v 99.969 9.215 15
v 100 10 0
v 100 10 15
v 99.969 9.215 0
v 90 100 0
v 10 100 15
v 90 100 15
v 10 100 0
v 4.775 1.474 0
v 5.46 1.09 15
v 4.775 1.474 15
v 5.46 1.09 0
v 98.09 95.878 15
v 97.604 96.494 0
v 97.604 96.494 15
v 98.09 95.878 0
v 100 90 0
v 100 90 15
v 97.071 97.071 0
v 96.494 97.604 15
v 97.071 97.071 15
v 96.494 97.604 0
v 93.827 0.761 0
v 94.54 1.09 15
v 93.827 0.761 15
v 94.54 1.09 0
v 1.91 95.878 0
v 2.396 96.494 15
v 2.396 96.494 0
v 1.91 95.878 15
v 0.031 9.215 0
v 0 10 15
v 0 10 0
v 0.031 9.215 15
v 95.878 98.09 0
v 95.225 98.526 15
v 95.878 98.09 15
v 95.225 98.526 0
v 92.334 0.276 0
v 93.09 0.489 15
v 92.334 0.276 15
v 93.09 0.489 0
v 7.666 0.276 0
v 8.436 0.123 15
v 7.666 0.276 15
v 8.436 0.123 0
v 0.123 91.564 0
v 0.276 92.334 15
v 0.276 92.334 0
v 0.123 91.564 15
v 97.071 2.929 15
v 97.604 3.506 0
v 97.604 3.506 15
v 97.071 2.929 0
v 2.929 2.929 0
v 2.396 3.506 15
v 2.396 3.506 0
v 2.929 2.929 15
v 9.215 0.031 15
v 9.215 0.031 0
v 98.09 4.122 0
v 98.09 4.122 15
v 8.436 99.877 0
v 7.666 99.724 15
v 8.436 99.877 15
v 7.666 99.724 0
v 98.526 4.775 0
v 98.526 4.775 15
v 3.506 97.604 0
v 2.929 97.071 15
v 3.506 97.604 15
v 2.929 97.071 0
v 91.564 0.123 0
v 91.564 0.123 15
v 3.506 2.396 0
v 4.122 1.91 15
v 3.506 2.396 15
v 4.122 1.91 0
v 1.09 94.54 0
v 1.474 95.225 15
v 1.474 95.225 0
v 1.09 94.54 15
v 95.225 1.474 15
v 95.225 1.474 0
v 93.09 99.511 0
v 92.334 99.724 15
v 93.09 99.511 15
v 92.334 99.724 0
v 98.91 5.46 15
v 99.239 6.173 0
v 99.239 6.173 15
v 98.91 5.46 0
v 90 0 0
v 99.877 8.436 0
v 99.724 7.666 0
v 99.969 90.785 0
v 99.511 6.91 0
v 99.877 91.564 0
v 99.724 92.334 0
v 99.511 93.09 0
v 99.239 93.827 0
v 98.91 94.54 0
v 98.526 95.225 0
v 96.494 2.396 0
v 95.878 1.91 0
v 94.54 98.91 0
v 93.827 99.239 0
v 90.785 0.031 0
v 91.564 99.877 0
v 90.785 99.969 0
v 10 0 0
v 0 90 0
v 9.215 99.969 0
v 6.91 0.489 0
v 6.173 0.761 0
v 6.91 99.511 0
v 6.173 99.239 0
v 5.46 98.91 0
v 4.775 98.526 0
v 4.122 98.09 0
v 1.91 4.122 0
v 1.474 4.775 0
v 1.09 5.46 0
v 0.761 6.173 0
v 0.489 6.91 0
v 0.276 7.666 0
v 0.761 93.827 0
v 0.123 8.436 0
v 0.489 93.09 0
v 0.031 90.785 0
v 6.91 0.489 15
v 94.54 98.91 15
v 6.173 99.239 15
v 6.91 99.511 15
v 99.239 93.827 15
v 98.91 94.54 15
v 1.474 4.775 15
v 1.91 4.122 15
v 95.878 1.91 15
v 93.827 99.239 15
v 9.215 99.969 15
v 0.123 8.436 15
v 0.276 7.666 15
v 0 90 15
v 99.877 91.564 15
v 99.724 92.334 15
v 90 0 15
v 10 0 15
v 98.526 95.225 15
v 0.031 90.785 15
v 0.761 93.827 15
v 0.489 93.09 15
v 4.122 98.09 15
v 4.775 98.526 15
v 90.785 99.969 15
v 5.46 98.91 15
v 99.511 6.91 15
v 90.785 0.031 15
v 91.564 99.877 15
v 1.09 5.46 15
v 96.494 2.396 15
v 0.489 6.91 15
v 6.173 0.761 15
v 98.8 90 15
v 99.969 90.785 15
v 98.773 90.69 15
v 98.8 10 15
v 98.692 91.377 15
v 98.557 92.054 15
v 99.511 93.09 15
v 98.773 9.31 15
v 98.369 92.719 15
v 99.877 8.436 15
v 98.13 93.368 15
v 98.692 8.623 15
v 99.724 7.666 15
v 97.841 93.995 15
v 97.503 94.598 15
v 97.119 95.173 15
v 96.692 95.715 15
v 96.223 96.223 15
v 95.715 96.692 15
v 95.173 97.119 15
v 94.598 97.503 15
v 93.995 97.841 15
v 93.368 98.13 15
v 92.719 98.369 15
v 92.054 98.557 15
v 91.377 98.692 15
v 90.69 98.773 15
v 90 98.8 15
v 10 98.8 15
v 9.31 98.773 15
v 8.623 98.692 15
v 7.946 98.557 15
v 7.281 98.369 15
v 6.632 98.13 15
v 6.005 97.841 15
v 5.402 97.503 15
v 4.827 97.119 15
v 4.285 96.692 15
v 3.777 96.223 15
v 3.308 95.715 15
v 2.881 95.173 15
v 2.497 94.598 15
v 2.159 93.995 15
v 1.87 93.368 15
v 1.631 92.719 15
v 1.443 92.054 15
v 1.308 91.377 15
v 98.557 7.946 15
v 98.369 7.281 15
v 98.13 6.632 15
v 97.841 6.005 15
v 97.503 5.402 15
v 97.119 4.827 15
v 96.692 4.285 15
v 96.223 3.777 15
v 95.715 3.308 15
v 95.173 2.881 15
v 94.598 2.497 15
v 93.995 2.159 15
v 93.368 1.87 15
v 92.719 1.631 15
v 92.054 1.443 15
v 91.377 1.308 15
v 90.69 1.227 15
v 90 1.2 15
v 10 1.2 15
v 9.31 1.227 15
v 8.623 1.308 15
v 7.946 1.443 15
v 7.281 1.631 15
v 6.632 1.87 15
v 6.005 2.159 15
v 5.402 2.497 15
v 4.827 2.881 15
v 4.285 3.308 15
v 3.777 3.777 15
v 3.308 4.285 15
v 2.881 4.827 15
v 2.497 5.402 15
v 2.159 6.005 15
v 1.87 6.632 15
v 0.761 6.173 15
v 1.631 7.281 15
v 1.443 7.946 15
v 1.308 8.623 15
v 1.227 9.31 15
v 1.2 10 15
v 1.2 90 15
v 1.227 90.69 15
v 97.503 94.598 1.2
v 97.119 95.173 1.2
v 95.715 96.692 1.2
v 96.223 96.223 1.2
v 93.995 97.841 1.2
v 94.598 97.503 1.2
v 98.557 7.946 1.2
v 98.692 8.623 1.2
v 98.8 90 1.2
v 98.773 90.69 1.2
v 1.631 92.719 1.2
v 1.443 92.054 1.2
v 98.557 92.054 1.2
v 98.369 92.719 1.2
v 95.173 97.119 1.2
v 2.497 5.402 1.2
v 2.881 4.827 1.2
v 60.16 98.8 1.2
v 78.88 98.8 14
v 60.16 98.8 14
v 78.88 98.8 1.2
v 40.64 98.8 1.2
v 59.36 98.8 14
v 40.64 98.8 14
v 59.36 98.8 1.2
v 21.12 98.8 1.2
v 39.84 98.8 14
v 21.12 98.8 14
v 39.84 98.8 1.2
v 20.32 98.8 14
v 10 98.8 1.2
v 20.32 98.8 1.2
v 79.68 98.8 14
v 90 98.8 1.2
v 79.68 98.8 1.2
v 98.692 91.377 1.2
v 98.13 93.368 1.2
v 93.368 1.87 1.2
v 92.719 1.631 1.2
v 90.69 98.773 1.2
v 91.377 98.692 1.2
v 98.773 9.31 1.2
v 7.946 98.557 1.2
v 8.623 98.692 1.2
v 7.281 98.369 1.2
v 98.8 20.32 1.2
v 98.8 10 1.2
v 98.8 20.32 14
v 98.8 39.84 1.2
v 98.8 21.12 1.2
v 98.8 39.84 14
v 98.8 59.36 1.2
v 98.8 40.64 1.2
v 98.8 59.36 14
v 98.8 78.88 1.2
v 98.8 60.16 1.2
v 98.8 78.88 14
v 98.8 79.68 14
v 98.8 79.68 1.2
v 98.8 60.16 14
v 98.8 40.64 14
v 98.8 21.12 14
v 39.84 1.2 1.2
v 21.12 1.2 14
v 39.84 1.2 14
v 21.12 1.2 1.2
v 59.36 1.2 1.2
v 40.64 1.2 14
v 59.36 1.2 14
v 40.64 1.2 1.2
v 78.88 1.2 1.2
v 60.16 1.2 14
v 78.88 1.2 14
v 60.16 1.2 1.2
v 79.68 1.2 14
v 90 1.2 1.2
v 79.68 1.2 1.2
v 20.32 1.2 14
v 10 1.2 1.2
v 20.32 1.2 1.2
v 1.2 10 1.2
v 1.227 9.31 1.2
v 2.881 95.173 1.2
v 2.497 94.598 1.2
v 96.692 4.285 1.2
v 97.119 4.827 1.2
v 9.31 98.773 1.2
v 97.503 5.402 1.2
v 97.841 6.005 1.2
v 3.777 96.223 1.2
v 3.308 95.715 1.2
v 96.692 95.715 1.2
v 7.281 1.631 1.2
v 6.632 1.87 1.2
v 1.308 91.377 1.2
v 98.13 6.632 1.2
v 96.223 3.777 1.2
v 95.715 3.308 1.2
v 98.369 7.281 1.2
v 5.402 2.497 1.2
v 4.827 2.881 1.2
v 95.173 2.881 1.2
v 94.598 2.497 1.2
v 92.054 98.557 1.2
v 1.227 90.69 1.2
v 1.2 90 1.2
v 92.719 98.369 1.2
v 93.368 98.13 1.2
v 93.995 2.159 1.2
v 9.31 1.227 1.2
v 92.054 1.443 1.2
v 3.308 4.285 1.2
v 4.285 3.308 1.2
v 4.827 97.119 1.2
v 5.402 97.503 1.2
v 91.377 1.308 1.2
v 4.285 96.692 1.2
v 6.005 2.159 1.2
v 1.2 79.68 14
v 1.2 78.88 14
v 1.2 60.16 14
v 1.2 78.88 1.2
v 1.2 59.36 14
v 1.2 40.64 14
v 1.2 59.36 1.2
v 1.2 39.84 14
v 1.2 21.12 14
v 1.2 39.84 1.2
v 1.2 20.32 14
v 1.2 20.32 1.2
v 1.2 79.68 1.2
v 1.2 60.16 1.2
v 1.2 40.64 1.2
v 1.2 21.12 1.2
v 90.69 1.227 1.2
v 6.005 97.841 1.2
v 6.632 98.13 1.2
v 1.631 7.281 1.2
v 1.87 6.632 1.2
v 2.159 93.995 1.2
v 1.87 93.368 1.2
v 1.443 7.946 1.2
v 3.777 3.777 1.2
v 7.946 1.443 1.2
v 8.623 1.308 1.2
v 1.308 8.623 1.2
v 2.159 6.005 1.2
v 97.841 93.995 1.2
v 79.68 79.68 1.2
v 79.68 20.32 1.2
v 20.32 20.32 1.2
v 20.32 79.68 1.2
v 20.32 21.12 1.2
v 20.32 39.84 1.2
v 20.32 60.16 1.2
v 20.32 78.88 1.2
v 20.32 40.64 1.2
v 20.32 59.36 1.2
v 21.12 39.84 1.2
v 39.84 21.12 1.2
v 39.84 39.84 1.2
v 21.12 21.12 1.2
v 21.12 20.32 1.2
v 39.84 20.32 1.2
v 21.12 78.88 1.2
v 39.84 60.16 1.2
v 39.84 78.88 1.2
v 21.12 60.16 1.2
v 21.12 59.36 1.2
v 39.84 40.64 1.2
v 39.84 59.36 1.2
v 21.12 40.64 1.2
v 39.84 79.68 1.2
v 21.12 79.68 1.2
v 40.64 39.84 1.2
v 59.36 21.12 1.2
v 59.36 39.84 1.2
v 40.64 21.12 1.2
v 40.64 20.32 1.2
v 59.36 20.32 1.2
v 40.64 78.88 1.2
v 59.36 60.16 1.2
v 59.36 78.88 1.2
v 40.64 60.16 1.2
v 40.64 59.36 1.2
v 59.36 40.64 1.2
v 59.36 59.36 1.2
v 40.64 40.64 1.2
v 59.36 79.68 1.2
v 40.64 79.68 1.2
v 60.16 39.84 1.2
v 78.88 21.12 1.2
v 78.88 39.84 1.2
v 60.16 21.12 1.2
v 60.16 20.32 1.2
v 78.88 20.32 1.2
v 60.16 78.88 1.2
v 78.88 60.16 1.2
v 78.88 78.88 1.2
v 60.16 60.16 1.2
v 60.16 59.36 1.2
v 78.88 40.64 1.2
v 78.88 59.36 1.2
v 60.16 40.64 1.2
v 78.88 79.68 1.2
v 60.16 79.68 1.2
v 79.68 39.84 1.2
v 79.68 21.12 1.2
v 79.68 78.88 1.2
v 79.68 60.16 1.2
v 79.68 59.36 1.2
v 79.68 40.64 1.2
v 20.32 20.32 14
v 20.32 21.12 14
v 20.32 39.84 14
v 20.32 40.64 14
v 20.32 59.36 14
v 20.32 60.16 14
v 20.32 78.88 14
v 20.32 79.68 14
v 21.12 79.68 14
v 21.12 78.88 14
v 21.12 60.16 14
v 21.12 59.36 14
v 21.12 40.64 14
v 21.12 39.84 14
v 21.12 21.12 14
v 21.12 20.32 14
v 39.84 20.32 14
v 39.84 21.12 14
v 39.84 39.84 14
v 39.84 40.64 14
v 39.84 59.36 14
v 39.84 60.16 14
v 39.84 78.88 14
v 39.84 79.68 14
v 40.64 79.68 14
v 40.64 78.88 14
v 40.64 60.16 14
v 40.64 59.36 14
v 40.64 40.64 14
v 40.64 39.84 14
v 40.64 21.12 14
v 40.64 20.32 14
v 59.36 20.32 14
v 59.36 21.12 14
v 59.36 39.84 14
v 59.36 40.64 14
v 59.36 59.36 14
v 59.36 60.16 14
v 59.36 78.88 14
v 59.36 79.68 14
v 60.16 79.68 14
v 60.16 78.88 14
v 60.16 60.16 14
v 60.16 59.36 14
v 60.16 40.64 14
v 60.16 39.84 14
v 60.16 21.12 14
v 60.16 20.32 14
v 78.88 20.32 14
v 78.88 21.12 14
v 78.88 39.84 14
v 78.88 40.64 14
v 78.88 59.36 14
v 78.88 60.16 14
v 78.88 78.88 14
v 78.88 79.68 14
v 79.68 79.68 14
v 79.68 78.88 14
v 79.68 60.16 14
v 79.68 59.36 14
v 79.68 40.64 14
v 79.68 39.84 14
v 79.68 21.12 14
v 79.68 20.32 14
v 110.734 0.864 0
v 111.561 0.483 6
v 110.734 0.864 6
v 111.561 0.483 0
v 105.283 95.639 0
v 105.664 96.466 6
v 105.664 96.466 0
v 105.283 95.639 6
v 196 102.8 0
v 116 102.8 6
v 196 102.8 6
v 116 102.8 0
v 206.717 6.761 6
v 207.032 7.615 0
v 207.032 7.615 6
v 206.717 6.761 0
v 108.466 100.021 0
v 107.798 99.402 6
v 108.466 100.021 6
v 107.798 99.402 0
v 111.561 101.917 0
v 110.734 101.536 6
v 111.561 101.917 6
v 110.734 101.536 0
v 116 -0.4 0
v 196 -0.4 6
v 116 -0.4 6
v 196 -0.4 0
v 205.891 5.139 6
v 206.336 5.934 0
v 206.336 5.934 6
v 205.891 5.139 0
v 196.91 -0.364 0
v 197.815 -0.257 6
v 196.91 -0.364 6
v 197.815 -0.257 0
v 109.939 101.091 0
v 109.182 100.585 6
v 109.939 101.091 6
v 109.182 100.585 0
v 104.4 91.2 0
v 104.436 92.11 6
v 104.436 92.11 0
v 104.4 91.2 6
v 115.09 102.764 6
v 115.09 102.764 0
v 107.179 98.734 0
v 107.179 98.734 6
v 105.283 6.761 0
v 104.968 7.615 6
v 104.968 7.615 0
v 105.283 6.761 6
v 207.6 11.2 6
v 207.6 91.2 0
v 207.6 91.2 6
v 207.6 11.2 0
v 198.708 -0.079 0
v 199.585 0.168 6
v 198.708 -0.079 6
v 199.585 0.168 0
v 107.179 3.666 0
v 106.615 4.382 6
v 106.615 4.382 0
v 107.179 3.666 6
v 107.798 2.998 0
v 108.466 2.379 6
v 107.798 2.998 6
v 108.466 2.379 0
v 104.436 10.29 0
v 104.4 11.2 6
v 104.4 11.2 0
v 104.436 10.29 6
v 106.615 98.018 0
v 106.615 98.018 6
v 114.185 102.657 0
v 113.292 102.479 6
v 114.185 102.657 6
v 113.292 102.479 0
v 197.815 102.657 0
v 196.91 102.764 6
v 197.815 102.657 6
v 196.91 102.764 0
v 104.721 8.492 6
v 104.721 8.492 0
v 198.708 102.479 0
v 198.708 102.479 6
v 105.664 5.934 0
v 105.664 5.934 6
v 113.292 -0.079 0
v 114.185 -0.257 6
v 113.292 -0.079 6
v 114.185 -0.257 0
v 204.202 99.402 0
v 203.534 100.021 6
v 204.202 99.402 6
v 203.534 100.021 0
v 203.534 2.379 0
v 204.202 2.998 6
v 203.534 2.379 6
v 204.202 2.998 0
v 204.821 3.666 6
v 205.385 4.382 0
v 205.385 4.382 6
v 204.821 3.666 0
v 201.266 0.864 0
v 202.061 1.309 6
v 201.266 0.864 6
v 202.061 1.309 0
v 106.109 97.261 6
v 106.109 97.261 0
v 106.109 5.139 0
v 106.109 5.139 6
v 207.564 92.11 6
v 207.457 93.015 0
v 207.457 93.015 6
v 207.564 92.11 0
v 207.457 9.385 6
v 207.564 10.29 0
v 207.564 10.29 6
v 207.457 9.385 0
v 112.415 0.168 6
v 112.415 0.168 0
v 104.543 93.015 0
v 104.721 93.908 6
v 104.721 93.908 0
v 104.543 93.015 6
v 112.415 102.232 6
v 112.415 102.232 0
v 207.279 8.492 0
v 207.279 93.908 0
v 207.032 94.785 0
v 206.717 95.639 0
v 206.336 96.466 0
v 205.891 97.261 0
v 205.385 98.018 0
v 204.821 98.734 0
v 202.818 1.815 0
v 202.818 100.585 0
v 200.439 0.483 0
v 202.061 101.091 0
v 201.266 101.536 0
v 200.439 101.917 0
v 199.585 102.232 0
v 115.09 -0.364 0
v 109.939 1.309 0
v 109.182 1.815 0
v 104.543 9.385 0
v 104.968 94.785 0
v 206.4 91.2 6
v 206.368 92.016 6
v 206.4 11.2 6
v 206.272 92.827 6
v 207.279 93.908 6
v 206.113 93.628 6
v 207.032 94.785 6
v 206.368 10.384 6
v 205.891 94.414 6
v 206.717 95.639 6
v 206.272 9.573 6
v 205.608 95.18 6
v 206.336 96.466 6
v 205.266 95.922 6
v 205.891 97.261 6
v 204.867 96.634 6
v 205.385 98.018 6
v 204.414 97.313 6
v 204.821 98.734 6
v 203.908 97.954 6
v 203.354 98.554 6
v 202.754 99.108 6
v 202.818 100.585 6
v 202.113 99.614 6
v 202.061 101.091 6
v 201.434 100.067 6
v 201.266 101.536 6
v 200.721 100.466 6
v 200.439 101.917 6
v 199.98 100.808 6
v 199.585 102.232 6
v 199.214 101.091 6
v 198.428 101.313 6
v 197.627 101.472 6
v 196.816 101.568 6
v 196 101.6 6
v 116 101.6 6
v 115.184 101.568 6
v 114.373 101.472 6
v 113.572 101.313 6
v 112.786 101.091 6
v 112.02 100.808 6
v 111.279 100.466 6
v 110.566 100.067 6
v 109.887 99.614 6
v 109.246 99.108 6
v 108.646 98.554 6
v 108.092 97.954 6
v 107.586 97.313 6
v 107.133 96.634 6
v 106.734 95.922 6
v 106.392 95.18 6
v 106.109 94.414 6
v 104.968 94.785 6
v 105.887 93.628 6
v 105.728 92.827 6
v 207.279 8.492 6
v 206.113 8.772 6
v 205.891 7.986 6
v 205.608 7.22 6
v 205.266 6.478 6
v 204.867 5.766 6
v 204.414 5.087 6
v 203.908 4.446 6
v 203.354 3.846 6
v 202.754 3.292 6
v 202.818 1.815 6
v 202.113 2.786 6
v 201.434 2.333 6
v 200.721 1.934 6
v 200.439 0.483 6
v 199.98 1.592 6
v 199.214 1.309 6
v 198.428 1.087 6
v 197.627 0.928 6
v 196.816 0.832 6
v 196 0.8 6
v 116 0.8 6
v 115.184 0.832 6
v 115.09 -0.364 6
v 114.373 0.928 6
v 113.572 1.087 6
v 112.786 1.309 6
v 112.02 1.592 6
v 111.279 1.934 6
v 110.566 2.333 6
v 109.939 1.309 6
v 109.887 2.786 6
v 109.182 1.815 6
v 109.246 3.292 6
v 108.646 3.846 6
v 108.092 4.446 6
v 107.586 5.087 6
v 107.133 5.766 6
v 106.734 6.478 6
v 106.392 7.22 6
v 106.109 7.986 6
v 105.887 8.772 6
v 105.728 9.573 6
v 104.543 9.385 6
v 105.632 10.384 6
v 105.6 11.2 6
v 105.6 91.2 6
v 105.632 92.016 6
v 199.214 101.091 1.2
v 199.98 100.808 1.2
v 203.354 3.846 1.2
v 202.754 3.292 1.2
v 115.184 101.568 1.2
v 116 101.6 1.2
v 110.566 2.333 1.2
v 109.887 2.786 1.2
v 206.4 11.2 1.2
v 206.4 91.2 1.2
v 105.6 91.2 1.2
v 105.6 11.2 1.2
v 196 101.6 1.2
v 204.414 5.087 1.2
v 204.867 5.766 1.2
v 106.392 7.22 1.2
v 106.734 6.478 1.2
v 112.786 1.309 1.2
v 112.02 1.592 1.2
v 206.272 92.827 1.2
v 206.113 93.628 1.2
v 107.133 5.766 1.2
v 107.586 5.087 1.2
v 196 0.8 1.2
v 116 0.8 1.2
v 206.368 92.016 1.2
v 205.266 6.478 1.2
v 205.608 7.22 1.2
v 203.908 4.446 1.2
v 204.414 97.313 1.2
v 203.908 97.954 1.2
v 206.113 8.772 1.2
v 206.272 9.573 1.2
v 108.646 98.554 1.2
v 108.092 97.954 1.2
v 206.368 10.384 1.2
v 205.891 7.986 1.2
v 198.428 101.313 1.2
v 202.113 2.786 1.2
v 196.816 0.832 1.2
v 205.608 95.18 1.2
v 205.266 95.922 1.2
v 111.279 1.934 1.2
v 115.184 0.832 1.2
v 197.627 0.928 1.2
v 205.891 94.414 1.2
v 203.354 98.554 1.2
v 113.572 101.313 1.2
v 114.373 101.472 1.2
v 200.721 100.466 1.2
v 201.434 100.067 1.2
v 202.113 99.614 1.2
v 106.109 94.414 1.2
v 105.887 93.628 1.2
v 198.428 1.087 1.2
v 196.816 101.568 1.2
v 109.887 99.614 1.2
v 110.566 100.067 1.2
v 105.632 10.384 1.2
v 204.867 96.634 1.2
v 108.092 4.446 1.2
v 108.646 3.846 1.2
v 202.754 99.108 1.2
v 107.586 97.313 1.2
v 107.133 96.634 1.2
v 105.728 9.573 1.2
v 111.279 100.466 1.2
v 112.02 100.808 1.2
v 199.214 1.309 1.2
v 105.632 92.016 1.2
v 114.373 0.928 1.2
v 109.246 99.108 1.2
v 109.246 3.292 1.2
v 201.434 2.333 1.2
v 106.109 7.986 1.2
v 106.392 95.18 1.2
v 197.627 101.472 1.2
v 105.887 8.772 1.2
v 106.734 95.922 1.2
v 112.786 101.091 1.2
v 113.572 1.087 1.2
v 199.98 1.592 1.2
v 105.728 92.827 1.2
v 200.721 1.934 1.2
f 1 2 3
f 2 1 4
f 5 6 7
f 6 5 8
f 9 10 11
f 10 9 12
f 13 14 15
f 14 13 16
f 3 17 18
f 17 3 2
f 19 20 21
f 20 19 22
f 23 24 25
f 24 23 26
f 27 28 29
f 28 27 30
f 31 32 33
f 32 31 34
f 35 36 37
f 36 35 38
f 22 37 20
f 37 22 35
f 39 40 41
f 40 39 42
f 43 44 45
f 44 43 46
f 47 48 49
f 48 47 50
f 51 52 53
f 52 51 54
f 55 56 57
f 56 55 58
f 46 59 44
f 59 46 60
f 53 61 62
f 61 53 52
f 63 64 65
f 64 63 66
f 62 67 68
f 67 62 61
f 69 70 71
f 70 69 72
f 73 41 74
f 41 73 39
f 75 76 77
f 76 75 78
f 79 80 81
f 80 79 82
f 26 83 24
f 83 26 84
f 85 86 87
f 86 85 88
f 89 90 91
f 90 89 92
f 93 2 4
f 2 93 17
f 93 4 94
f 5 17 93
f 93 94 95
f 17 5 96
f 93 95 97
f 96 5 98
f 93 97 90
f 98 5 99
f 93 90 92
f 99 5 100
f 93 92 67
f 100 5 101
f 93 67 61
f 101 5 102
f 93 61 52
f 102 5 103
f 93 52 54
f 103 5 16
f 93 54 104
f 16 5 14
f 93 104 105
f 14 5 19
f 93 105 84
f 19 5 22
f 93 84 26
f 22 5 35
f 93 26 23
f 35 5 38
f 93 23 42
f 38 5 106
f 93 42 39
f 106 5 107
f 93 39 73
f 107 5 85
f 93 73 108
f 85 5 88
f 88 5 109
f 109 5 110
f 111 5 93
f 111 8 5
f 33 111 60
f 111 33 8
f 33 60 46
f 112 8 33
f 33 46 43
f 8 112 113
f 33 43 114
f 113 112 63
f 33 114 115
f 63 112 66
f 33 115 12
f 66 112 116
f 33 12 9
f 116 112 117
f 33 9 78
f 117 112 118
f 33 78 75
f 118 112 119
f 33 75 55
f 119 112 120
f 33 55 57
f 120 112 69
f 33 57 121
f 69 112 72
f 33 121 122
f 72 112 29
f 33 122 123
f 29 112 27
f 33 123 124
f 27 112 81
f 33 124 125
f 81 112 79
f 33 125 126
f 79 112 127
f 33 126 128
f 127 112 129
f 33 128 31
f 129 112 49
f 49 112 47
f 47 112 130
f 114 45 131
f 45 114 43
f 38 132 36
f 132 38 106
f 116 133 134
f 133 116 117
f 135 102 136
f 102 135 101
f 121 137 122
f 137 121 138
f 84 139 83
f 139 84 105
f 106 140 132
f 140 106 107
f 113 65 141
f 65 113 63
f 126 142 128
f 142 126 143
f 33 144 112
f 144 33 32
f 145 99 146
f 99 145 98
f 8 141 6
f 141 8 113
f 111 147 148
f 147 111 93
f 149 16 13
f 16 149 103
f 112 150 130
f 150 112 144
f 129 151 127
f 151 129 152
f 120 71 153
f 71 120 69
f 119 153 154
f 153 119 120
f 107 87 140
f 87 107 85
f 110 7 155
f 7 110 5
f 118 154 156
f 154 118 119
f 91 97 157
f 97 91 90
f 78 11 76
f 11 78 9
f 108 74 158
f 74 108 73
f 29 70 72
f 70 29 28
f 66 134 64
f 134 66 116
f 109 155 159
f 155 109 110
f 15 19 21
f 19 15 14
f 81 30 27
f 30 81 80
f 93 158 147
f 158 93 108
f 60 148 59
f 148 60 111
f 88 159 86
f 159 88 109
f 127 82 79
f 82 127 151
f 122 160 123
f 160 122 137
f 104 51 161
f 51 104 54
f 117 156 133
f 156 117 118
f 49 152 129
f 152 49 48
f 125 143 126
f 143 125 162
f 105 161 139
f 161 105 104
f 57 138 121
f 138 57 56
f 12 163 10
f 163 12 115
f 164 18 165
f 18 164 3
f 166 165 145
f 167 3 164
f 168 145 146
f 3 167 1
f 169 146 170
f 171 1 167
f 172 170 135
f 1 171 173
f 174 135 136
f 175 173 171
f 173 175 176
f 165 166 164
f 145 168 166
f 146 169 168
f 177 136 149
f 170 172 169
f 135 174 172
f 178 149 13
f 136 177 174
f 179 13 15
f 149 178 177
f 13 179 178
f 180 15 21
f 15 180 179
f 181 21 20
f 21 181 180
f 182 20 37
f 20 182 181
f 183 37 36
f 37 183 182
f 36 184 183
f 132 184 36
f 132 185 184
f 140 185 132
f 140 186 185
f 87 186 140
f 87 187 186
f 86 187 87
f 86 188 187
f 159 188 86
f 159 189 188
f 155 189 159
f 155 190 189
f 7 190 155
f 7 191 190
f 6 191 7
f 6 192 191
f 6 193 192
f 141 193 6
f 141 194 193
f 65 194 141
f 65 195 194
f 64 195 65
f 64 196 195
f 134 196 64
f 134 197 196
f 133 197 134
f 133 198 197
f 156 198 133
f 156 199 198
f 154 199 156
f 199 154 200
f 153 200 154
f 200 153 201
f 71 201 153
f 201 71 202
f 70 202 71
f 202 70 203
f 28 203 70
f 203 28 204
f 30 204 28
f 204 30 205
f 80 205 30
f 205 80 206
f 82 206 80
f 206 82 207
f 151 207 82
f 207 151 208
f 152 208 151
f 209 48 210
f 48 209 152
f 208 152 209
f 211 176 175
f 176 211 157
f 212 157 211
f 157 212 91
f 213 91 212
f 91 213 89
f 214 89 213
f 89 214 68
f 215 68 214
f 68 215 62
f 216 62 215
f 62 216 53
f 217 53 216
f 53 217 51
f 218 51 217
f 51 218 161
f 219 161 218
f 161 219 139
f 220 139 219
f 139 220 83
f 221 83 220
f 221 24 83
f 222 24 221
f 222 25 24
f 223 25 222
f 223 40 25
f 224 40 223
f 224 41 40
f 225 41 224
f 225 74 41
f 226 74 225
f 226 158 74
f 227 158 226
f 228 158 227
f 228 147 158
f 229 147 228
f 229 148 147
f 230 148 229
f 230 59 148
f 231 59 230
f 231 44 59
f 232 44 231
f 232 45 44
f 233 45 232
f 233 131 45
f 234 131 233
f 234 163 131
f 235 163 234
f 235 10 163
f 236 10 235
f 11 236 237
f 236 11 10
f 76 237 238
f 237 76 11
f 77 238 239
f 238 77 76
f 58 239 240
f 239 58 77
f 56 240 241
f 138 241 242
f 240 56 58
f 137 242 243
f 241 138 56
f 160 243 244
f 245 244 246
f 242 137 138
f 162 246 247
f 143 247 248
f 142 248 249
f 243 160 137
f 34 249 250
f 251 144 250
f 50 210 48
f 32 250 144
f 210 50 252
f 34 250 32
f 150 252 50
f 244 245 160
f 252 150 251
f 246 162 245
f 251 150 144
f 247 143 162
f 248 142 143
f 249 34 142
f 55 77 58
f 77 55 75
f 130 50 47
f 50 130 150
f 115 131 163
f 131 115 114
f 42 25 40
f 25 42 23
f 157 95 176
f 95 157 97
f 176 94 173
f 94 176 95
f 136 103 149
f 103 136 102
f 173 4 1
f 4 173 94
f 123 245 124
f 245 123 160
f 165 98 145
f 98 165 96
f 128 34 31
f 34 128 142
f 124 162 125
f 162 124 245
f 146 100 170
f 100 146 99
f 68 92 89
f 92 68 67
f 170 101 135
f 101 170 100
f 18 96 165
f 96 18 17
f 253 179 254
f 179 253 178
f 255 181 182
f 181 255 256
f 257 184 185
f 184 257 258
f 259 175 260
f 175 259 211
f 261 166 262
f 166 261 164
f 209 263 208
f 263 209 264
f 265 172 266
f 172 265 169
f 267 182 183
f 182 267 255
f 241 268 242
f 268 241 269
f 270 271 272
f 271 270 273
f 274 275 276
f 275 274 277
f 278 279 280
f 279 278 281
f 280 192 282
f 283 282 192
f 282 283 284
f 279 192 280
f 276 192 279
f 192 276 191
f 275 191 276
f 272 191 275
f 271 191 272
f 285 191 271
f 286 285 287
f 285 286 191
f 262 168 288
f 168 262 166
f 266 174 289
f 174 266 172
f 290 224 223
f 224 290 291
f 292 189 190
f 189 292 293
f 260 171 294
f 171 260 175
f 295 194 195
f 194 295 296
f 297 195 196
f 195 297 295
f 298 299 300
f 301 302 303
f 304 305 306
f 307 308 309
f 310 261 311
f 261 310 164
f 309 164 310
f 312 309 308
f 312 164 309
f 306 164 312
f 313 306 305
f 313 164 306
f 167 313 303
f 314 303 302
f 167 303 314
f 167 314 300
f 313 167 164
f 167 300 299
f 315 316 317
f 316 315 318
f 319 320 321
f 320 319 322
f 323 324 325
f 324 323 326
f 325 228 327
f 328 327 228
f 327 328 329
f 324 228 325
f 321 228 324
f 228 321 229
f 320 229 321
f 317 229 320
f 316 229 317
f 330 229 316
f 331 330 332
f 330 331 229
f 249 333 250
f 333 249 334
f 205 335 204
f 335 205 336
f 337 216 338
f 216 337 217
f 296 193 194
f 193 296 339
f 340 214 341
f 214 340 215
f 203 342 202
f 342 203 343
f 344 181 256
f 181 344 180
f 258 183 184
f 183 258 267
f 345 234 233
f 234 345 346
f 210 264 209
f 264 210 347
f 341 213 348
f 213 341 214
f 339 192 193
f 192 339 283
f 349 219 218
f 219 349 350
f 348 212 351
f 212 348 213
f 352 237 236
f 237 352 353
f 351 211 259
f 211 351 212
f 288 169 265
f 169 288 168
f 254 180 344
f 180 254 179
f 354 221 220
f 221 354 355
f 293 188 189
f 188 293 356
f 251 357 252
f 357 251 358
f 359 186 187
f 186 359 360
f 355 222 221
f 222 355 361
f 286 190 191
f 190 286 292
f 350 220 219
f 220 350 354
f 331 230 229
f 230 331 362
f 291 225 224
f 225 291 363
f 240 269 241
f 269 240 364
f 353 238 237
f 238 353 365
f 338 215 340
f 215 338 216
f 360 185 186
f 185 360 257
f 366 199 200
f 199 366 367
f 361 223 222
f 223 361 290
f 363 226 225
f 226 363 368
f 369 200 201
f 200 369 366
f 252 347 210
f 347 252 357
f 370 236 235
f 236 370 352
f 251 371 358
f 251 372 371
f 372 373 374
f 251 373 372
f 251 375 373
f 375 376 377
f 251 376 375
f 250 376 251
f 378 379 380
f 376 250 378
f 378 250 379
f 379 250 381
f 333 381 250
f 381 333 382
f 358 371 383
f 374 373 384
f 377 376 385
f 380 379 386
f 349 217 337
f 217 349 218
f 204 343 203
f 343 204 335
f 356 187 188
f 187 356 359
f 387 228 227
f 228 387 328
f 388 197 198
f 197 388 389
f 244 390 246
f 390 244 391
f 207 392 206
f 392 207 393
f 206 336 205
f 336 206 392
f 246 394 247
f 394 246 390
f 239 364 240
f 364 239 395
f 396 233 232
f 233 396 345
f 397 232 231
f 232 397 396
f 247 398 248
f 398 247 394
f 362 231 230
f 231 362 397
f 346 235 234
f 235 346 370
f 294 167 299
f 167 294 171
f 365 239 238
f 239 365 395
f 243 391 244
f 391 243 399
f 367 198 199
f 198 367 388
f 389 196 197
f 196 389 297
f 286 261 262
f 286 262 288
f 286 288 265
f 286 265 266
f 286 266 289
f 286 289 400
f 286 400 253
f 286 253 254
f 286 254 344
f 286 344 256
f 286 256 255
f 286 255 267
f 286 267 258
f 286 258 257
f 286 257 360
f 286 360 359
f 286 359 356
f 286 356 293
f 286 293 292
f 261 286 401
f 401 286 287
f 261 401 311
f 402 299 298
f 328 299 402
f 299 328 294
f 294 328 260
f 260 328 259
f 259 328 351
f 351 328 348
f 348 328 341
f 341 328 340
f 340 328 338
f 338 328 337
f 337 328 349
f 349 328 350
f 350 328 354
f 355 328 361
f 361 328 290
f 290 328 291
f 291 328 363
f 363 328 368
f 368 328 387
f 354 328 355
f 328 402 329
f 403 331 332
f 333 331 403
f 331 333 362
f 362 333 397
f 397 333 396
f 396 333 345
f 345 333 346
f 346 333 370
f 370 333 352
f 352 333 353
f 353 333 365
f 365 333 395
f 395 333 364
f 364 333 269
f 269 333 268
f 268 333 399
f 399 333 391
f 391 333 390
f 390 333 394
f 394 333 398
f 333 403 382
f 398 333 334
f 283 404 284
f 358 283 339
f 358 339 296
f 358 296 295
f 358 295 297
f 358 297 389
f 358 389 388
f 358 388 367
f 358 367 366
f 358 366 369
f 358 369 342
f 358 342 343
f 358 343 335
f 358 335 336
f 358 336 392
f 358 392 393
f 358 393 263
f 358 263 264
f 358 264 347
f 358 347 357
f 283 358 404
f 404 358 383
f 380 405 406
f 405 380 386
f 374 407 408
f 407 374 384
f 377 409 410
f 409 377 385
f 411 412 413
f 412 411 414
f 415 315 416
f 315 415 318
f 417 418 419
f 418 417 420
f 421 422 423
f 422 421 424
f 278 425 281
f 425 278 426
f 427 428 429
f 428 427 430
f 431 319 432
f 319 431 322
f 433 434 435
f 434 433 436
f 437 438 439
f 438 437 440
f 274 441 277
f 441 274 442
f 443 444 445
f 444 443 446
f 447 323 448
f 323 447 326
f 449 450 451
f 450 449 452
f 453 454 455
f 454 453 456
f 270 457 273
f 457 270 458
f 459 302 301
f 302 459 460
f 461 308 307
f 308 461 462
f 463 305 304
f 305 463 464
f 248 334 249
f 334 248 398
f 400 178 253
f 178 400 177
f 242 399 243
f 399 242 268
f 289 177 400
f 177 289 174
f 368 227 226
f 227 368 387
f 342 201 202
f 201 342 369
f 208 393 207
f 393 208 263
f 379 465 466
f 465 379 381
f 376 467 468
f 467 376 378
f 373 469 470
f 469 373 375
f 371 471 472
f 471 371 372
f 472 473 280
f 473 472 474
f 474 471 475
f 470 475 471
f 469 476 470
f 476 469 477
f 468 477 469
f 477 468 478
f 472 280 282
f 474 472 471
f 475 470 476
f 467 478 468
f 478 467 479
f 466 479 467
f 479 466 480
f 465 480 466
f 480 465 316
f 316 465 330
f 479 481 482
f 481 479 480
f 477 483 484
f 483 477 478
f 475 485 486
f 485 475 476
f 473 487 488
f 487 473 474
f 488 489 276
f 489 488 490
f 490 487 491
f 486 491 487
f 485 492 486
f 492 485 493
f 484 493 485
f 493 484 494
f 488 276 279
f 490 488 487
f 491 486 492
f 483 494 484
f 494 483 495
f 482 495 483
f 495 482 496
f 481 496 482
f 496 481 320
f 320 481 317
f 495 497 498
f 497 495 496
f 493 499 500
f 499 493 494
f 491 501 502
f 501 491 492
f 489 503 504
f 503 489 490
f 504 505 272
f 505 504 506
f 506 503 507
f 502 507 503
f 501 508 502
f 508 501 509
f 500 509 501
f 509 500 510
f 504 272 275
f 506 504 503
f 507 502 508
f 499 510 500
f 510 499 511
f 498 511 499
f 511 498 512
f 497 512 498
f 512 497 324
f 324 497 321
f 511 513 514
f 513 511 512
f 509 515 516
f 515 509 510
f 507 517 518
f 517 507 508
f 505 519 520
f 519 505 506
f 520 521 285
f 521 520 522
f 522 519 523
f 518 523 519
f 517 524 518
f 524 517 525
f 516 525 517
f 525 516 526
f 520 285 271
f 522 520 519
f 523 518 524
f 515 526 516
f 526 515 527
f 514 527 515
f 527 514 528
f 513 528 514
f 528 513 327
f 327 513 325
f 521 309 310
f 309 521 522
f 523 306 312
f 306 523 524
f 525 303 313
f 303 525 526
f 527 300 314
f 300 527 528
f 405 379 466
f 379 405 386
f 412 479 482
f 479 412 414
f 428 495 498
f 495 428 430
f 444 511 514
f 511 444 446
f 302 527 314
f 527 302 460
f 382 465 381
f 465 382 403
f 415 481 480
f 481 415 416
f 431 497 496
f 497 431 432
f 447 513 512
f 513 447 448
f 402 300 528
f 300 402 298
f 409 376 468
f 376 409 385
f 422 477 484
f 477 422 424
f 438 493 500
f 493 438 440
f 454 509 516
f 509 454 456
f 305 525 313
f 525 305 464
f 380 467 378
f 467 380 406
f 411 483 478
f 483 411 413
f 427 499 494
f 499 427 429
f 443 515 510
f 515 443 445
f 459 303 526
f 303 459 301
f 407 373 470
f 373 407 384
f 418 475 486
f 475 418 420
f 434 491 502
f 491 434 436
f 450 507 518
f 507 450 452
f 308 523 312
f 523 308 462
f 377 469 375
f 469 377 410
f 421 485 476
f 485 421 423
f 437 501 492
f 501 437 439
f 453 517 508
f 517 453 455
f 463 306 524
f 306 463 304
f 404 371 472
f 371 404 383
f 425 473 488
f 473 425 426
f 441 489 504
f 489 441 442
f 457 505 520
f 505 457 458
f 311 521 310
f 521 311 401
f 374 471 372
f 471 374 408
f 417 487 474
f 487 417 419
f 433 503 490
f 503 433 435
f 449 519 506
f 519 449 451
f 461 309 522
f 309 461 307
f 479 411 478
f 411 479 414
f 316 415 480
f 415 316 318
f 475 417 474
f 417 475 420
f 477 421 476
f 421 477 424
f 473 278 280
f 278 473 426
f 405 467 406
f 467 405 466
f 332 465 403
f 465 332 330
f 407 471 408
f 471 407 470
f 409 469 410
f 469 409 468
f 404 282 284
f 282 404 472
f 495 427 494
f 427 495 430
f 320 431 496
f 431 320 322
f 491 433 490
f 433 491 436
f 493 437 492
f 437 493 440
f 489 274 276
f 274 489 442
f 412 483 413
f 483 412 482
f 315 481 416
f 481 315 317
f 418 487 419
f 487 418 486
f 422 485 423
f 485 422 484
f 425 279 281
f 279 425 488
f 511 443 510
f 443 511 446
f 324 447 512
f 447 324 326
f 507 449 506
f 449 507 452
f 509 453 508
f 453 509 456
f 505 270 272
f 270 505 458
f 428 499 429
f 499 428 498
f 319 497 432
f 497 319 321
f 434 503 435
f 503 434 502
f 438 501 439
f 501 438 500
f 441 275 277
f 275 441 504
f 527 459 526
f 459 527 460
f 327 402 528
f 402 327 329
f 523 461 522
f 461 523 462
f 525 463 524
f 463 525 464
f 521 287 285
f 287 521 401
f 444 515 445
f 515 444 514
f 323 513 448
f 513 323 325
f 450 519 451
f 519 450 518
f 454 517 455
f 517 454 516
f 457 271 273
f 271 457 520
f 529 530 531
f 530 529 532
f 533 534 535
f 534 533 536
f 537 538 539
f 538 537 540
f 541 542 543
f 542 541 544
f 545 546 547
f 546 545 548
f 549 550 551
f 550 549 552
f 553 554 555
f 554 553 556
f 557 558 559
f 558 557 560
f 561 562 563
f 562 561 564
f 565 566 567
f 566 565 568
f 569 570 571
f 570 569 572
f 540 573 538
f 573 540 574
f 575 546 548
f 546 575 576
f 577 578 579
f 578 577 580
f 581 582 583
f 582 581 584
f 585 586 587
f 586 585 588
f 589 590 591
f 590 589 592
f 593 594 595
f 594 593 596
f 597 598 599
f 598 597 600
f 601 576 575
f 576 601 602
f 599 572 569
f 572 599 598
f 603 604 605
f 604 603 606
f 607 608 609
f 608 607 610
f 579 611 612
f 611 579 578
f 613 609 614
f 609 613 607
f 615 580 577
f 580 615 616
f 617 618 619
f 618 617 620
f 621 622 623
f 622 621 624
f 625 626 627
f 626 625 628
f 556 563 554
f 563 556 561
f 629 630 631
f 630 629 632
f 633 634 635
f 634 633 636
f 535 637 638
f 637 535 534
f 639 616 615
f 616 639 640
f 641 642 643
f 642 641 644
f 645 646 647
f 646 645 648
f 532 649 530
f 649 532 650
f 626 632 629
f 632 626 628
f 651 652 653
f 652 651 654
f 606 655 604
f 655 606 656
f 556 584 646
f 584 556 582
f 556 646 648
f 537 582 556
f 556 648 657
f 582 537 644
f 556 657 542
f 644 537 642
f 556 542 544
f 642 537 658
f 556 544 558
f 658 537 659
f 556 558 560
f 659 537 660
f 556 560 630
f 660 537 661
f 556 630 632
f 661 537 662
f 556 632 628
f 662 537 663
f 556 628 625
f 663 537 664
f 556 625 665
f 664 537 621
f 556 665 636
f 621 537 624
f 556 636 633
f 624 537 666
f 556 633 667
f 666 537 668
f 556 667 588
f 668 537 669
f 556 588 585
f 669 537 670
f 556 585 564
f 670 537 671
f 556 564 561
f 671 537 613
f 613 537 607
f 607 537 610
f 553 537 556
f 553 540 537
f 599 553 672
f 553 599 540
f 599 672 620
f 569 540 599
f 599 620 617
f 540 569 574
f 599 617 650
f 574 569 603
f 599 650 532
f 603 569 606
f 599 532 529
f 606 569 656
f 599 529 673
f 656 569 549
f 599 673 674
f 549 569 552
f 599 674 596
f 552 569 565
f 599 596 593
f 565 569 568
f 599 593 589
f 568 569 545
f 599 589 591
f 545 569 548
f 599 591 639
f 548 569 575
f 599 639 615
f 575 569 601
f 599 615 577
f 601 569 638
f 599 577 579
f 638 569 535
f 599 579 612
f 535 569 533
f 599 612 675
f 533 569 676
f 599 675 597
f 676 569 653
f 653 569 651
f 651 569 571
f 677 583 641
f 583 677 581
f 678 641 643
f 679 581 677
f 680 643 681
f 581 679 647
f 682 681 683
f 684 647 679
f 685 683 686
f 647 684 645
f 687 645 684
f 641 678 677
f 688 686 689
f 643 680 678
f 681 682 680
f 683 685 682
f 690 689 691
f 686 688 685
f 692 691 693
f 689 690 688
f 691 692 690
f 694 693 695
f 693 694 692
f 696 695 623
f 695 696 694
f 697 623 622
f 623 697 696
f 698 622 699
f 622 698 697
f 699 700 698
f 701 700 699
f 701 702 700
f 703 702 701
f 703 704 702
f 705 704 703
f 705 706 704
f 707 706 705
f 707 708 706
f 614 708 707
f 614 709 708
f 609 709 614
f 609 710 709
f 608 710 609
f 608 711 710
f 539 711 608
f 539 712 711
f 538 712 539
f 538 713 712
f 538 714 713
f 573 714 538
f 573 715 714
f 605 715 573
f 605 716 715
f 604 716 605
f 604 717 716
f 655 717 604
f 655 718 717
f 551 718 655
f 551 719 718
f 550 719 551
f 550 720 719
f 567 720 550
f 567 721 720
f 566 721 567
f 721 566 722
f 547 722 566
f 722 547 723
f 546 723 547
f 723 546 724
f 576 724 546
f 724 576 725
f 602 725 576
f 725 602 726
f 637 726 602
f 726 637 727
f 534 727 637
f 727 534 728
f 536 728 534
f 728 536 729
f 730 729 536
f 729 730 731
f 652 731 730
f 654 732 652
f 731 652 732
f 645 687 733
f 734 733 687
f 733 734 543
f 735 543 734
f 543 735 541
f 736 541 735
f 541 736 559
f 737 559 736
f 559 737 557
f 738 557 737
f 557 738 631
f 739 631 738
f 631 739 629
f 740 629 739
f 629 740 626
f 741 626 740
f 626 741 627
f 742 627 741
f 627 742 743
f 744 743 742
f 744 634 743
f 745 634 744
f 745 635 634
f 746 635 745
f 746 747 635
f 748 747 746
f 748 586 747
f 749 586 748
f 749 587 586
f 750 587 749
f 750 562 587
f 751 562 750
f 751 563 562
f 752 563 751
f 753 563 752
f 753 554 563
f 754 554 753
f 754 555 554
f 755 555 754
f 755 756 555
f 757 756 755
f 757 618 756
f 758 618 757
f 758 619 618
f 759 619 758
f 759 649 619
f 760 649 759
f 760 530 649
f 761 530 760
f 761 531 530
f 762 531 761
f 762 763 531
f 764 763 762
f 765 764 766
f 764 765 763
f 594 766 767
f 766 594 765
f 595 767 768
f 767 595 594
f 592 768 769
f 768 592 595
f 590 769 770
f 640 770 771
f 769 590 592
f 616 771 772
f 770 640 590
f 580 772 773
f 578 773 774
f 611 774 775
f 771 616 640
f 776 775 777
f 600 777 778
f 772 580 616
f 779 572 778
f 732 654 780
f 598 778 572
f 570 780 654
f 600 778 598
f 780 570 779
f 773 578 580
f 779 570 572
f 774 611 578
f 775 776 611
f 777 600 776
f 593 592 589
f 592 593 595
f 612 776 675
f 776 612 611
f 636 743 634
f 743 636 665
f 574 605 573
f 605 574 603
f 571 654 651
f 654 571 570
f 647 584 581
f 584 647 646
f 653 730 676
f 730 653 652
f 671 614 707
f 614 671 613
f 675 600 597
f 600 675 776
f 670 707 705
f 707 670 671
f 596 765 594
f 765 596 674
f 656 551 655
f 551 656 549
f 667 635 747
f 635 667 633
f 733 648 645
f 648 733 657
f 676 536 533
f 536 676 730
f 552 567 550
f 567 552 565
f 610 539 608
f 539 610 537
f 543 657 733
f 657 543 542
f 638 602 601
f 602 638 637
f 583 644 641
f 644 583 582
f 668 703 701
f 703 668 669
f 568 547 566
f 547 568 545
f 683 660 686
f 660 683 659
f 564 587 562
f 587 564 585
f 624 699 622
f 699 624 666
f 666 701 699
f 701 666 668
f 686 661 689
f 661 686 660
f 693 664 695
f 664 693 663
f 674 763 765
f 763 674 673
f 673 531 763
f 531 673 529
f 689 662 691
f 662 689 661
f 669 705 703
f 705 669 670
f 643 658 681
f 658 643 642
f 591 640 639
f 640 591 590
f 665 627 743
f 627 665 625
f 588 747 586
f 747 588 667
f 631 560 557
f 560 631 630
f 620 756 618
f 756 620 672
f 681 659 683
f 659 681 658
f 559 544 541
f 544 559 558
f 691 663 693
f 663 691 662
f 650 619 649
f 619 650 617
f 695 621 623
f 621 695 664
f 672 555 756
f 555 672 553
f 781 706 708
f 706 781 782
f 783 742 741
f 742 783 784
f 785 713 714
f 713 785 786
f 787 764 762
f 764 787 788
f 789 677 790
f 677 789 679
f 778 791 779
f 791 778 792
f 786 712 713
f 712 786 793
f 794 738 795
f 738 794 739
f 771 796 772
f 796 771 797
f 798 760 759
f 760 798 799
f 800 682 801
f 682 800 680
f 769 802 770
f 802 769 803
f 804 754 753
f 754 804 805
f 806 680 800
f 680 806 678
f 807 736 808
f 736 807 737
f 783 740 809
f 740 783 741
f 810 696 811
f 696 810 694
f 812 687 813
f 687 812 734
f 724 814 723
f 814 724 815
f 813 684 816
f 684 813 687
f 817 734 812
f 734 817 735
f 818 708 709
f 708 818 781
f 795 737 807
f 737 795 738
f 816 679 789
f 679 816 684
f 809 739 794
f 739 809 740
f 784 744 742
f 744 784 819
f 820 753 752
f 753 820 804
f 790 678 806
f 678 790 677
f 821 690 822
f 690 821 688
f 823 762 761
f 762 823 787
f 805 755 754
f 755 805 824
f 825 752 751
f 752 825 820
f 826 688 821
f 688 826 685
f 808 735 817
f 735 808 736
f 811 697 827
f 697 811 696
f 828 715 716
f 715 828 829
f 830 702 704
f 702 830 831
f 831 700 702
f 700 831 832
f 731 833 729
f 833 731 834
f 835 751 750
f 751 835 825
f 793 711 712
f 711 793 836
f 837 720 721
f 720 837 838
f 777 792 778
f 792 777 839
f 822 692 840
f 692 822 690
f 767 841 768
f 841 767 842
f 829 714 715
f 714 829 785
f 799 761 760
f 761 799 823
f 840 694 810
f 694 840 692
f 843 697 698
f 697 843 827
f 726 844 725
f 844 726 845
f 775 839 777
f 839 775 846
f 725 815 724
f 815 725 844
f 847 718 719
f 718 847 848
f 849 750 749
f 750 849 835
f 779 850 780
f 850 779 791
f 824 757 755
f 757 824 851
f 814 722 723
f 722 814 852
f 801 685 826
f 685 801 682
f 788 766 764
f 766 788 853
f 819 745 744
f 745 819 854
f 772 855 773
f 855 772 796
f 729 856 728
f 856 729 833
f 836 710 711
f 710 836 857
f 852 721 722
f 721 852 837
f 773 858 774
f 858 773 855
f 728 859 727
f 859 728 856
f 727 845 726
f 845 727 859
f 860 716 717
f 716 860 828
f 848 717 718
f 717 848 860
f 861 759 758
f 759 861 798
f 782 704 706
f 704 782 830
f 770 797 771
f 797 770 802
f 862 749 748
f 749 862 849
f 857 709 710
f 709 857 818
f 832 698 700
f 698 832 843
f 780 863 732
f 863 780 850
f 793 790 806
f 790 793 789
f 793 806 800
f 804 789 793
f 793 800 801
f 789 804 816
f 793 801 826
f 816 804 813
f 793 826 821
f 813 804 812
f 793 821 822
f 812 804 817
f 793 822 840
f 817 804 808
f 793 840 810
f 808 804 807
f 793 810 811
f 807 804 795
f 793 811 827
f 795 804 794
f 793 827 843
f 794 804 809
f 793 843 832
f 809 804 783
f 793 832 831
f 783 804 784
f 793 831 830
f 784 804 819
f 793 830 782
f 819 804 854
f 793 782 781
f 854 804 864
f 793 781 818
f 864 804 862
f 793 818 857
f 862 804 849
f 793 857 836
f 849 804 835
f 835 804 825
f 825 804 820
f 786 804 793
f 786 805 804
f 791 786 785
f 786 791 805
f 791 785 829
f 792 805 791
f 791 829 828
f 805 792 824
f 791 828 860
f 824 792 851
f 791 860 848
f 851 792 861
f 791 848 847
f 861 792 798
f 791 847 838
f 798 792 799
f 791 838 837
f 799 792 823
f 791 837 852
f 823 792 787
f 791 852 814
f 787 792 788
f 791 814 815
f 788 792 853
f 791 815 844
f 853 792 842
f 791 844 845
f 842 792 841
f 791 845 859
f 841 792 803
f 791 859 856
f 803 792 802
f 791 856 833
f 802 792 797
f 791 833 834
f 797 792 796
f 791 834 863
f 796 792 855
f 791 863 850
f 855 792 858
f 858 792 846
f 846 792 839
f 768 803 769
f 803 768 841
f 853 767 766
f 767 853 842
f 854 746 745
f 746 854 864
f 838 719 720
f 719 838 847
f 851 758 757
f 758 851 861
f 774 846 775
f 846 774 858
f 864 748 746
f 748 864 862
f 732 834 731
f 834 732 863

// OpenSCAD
/* [Box] */
//Box height
height=15;
//Box length
length=100;
//Box width
width=100;
//Radius for corners (minimum 2)
cornerrad=10;
//Wall thickness
outwalls=1.2;
//Box thickness for floor
thickness=1.2;

/* [Box Sections] */
//Amount of sections in the length
sectionsl=5;
//Amount of sections in the width
sectionsw=5;
//Sections height
sectionsh=14;
//Inner walls thickness
inwalls=0.8;

/* [Lid] */
//Tolerance for lid
tol=0.4; 
//Lid thickness for top
lidthickness=1.2;
//Lid height
lidheight=6;

l=length-(cornerrad*2);
w=width-(cornerrad*2);

translate([cornerrad, cornerrad, 0]){
    union(){
        difference() {
            hull() {
                h = (height/2);
                translate([0,0,h]) cylinder(h=height, r=cornerrad, $fn=80, center = true);
                translate([0,l,h]) cylinder(h=height, r=cornerrad, $fn=80, center = true);
                translate([w,l,h]) cylinder(h=height, r=cornerrad, $fn=80, center = true);
                translate([w,0,h]) cylinder(h=height, r=cornerrad, $fn=80, center = true);
            }
            hull() {
                h = (height/2) + thickness;
                translate([0,0,h]) cylinder(h=height, r=cornerrad-outwalls, $fn=80, center = true);
                translate([0,l,h]) cylinder(h=height, r=cornerrad-outwalls, $fn=80, center = true);
                translate([w,l,h]) cylinder(h=height, r=cornerrad-outwalls, $fn=80, center = true);
                translate([w,0,h]) cylinder(h=height, r=cornerrad-outwalls, $fn=80, center = true);
            }
        }
        
        if( sectionsl > 0 ){
            cutl = ((length) - (outwalls*2))/sectionsl;
            for(i = [cutl : cutl : length-cutl]) {
                translate([w/2,i+outwalls-cornerrad,sectionsh/2]) cube([width,inwalls,sectionsh], center=true);
            }
        }
        
        if( sectionsw > 0 ){
            cutw = ((width) - (outwalls*2))/sectionsw;
            for(i = [cutw : cutw : width-cutw]) {
                translate([i+outwalls-cornerrad,l/2,sectionsh/2]) cube([inwalls,length,sectionsh], center=true);
            }
        }
        
    }

    translate([w + (cornerrad*2) + 6, outwalls, 0]){
        difference() {
            hull() {
                h = (lidheight/2);
                translate([0,0,h]) cylinder(h=lidheight, r=cornerrad+tol+outwalls, $fn=80, center = true);
                translate([0,l,h]) cylinder(h=lidheight, r=cornerrad+tol+outwalls, $fn=80, center = true);
                translate([w,l,h]) cylinder(h=lidheight, r=cornerrad+tol+outwalls, $fn=80, center = true);
                translate([w,0,h]) cylinder(h=lidheight, r=cornerrad+tol+outwalls, $fn=80, center = true);
            }
            
            hull() {
                h = (lidheight/2) + lidthickness;
                translate([0,0,h]) cylinder(h=lidheight, r=(cornerrad)+tol, $fn=80, center = true);
                translate([0,l,h]) cylinder(h=lidheight, r=(cornerrad)+tol, $fn=80, center = true);
                translate([w,l,h]) cylinder(h=lidheight, r=(cornerrad)+tol, $fn=80, center = true);
                translate([w,0,h]) cylinder(h=lidheight, r=(cornerrad)+tol, $fn=80, center = true);
            }
        }
    }
}
